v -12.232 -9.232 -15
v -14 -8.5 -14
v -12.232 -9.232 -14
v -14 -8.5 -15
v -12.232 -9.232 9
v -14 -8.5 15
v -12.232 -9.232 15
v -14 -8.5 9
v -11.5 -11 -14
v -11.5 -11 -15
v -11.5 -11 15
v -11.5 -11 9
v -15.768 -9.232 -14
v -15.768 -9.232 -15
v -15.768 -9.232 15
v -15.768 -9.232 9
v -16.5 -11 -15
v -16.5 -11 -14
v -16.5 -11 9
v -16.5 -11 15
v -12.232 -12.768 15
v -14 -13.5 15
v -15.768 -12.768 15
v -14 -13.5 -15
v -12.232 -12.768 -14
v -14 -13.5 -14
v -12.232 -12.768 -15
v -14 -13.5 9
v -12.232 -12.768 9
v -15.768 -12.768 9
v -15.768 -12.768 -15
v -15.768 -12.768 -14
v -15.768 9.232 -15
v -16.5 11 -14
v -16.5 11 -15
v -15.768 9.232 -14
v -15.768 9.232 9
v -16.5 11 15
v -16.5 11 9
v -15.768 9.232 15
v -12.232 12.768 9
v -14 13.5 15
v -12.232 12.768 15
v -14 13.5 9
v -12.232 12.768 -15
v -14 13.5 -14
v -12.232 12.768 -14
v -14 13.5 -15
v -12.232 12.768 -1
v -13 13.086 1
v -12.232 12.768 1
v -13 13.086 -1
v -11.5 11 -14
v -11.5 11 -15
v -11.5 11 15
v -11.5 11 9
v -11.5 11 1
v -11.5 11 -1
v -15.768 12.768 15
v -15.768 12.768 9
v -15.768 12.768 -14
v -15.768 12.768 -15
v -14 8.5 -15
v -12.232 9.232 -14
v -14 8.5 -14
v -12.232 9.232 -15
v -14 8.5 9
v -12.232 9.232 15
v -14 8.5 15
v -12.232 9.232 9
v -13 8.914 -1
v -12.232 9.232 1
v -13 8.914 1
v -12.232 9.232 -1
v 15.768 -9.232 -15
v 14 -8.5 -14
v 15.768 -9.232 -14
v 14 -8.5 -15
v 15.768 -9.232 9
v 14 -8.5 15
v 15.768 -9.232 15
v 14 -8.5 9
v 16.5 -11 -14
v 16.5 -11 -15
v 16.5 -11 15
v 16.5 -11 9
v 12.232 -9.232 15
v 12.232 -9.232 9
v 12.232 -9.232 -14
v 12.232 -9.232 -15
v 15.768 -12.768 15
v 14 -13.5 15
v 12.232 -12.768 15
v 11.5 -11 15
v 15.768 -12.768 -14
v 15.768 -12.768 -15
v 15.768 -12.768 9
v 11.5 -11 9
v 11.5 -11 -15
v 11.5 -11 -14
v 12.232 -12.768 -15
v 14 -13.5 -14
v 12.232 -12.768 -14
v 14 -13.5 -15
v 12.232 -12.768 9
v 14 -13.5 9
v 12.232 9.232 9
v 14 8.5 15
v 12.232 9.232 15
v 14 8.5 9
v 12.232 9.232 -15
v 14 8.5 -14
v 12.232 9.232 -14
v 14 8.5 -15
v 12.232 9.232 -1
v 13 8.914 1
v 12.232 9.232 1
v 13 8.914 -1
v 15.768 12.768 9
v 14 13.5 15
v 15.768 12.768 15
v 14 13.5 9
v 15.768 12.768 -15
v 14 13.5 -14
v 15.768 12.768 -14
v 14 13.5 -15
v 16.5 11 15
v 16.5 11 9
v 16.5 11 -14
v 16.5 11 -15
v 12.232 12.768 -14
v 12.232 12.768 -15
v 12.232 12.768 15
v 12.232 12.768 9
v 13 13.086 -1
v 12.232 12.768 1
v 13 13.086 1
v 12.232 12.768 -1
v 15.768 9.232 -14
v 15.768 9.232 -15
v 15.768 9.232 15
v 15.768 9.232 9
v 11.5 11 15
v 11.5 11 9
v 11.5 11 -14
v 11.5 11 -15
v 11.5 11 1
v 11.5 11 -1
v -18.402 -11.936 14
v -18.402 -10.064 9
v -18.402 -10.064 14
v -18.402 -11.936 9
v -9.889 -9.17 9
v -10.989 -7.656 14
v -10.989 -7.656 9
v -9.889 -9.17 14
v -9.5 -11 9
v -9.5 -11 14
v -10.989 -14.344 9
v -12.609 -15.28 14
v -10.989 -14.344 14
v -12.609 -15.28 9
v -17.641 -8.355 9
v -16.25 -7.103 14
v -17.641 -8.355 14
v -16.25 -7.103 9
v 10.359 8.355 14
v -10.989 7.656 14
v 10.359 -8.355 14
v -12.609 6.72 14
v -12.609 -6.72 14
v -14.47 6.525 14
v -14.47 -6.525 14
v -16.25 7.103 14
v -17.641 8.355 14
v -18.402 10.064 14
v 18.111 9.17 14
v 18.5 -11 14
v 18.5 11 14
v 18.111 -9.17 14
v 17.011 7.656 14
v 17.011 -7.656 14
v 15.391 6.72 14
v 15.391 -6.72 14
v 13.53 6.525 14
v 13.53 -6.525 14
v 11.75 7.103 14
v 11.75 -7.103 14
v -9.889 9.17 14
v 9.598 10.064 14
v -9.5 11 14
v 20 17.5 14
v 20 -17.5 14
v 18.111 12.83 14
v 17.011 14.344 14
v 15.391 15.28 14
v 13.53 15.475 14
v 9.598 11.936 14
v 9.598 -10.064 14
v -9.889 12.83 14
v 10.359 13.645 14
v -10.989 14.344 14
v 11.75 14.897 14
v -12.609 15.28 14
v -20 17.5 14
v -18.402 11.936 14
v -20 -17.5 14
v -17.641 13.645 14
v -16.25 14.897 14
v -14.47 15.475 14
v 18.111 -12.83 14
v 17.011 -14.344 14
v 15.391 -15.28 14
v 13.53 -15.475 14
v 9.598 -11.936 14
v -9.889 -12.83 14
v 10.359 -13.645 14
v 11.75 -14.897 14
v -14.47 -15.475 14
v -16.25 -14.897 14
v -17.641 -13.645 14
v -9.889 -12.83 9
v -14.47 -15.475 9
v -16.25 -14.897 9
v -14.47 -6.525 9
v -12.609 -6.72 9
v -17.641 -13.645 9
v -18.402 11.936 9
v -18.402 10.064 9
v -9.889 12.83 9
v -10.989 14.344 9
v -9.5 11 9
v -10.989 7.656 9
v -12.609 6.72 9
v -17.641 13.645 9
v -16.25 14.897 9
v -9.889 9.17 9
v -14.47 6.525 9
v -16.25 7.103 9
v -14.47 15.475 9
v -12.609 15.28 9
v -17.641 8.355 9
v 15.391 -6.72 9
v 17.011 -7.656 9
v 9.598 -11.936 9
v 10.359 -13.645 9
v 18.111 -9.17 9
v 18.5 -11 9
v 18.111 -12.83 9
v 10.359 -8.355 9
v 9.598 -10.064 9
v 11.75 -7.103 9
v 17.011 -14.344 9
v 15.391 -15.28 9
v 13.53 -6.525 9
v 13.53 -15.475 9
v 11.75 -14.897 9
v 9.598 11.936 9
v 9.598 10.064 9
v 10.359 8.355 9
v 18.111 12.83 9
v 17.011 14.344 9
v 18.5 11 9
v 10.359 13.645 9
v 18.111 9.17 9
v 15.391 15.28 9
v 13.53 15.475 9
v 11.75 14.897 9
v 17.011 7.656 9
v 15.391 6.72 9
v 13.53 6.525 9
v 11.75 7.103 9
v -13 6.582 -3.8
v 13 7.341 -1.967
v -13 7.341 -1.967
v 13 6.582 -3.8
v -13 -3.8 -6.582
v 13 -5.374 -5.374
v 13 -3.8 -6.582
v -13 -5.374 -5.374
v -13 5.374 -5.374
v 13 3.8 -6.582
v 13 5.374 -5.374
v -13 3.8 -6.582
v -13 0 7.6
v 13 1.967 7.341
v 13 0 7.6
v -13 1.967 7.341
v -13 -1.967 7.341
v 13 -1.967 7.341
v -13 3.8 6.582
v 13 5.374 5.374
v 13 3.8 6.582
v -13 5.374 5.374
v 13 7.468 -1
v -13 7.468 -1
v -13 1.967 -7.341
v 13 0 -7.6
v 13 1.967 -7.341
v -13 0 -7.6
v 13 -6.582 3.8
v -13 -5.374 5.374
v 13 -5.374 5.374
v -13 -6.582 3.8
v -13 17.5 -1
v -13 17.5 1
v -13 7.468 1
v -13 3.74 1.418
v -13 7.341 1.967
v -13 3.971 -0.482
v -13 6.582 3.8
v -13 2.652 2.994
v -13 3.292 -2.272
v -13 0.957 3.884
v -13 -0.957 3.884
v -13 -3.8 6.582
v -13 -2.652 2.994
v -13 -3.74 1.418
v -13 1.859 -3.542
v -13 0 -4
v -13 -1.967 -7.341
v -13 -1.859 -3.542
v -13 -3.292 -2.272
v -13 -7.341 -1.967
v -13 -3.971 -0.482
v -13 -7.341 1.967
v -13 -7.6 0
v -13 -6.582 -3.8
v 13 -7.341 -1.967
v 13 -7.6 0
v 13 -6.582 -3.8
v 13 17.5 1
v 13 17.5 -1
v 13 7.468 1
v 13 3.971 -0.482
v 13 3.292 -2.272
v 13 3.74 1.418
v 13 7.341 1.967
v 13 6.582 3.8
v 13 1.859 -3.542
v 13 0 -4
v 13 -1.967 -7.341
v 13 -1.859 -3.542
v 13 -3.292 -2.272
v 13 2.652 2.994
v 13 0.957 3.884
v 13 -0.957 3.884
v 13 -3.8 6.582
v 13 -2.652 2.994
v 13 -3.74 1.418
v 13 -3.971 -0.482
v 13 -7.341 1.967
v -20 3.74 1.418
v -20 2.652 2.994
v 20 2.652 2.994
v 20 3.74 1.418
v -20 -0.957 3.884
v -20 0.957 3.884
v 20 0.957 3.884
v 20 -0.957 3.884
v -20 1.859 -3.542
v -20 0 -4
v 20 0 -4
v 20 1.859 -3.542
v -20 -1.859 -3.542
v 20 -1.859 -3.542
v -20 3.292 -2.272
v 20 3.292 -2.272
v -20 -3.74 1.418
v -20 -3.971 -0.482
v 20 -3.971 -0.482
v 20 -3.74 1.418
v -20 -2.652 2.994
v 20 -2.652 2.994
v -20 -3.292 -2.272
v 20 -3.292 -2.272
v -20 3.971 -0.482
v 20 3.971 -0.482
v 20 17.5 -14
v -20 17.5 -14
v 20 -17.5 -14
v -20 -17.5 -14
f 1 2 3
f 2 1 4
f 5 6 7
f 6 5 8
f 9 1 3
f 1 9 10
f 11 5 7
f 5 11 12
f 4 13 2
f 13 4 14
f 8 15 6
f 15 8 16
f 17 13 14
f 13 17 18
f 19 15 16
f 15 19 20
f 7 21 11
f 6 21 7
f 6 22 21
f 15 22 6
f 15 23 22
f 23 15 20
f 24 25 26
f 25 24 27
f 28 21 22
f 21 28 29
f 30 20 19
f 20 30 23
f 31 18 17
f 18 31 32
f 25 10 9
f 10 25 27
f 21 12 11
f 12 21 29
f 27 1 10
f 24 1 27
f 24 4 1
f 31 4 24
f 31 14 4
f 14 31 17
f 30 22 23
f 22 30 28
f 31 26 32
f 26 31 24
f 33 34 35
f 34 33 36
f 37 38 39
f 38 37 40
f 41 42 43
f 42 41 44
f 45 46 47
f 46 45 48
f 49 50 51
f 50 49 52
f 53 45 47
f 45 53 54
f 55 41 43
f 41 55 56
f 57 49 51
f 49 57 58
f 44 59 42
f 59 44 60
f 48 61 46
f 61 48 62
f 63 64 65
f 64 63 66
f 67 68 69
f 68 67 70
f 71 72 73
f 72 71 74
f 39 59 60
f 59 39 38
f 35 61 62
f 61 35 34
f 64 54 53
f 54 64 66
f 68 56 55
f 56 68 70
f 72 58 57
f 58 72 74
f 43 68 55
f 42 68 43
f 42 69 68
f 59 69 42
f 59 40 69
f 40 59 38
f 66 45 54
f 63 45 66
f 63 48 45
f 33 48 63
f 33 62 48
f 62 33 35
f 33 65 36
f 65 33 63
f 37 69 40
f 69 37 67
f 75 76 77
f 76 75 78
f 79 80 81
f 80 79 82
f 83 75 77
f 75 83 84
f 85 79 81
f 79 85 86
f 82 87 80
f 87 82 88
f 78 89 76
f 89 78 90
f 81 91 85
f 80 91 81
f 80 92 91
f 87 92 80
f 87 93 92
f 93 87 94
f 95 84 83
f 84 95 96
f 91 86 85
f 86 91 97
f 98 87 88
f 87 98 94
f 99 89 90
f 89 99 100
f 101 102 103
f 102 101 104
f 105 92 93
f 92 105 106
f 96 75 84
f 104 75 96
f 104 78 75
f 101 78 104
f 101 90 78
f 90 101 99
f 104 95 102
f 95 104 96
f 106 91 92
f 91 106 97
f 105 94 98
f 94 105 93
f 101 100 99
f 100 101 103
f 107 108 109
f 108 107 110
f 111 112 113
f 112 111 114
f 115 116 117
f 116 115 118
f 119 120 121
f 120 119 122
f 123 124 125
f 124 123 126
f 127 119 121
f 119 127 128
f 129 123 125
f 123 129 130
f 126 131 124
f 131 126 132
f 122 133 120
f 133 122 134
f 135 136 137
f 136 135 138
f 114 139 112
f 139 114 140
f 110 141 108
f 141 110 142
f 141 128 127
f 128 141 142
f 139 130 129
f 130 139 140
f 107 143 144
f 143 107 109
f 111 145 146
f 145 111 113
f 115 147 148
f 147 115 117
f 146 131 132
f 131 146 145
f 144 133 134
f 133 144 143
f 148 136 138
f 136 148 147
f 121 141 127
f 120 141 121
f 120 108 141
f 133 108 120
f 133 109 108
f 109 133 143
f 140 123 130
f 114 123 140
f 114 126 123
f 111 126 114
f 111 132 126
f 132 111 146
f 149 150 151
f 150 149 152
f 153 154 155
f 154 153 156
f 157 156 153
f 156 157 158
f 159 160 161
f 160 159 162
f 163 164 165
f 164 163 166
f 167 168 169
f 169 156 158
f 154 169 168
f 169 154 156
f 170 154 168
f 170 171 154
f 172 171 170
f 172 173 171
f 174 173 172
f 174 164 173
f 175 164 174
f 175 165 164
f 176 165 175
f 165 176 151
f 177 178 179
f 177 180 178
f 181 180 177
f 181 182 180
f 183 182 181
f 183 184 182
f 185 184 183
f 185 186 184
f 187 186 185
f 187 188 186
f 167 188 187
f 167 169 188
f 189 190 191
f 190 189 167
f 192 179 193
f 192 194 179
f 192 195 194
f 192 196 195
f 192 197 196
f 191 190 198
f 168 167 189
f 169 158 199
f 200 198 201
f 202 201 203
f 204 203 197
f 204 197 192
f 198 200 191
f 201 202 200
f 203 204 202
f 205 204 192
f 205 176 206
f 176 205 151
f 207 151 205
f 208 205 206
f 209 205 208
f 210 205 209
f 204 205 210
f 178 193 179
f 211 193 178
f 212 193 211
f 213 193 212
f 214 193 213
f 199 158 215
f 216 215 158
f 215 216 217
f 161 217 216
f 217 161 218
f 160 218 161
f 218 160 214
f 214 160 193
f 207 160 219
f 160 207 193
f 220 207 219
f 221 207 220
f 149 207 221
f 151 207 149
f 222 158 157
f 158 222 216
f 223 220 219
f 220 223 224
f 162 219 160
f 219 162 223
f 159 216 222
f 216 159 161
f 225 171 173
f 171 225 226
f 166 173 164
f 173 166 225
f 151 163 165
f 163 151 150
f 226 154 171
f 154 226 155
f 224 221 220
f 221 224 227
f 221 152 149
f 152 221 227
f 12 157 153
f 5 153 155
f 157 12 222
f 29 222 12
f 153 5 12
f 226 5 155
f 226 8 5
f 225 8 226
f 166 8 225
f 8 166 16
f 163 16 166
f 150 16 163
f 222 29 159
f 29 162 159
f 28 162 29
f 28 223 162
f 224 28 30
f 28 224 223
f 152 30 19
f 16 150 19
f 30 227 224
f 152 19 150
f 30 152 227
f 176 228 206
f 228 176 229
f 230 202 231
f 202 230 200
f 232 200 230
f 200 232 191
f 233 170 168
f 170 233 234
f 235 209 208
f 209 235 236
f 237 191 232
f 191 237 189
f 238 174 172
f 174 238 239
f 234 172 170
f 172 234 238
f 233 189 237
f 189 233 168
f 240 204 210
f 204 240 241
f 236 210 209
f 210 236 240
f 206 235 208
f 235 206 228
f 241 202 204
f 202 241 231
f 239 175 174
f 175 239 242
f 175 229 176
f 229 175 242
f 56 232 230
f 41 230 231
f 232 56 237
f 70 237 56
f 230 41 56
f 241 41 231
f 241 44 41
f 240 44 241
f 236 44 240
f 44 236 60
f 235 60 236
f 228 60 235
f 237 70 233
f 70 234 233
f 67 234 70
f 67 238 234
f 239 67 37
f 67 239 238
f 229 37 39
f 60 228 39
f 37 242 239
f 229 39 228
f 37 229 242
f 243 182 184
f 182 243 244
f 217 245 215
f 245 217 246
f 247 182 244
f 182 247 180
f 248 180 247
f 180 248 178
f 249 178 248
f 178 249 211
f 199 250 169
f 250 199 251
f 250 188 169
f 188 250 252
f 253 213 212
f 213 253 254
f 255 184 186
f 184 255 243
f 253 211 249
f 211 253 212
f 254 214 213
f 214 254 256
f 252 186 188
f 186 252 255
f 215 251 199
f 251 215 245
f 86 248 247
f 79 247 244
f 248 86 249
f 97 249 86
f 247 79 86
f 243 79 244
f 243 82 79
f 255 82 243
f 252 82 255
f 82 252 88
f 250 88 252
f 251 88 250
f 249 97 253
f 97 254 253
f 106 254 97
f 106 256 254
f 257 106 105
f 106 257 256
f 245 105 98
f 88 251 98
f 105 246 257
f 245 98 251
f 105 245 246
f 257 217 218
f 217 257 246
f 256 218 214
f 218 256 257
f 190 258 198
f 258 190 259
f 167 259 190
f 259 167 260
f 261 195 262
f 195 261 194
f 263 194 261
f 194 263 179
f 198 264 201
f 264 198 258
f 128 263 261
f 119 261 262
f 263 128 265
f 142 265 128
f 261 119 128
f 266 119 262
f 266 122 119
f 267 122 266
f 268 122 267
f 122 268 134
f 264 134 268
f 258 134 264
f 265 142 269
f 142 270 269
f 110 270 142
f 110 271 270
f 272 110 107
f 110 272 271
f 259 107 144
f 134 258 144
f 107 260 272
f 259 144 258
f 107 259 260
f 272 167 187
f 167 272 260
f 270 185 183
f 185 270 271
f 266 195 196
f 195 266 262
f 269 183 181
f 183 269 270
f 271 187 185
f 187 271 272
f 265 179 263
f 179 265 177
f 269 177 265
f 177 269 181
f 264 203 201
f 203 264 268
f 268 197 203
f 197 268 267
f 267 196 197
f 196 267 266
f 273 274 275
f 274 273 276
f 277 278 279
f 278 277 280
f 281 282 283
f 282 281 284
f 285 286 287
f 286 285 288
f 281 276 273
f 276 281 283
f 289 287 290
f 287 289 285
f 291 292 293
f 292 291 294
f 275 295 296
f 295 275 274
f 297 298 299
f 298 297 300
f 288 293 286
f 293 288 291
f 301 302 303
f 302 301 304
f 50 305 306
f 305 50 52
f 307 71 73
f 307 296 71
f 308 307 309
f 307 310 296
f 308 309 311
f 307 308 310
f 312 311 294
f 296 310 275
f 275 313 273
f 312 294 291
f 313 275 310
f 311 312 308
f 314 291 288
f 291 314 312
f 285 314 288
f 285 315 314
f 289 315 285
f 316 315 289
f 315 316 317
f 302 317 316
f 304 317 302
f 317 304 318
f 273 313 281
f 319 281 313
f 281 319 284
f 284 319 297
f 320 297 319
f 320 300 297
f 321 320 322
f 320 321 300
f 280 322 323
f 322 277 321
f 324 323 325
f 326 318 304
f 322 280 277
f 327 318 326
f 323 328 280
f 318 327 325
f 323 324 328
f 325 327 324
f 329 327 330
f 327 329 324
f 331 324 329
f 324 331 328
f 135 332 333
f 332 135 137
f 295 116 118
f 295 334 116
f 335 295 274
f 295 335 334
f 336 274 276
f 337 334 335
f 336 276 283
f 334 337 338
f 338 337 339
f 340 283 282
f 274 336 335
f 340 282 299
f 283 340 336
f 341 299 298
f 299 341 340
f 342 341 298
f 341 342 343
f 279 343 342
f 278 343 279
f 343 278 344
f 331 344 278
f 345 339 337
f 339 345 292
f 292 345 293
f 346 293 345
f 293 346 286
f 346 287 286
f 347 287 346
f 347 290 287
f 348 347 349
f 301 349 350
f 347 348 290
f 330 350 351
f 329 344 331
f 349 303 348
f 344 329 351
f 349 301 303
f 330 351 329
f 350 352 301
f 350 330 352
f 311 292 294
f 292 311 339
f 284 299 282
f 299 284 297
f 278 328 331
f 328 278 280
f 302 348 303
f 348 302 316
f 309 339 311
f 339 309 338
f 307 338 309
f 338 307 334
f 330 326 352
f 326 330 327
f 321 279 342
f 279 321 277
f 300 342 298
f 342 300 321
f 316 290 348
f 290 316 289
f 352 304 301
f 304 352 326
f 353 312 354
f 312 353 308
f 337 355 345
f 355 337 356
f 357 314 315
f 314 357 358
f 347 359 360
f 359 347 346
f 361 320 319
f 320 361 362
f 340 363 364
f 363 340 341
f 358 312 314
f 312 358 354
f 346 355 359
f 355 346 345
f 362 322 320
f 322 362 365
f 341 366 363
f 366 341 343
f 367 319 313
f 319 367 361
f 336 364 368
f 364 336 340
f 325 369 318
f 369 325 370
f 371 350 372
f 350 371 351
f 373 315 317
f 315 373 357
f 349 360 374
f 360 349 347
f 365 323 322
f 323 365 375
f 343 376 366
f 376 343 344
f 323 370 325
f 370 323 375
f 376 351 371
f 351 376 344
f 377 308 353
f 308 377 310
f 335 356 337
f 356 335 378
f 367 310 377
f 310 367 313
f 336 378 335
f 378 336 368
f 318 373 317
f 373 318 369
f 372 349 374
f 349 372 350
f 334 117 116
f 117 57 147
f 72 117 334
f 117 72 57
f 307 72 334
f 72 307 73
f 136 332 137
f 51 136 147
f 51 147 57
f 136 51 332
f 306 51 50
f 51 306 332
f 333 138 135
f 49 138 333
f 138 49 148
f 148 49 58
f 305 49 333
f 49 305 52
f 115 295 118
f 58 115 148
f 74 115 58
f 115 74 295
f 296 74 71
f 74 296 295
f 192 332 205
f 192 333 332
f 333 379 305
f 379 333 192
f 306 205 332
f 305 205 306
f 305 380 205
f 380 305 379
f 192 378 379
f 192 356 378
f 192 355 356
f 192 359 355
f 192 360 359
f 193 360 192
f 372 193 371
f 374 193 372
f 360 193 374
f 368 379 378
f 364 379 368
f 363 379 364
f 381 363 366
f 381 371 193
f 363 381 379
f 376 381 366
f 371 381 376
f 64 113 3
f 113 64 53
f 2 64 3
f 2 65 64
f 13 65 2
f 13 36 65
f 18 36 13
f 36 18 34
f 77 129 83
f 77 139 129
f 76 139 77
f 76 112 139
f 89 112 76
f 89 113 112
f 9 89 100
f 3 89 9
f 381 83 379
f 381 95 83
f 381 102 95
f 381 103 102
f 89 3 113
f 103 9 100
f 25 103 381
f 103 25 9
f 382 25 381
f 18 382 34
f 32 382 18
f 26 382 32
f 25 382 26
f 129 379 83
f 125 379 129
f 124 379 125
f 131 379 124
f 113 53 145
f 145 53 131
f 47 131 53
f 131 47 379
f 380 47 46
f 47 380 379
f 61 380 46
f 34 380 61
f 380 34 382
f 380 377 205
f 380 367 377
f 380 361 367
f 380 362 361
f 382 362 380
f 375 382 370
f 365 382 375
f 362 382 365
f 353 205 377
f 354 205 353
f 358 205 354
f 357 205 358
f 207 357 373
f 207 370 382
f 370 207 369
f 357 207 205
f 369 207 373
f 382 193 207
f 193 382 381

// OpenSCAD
// Parameters
block_length = 40.0; //[20.0:80.0:0.5]
block_width = 35.0; //[18.0:70.0:0.5]
block_height = 28.0; //[14.0:56.0:0.5]
shaft_diameter = 8.0; //[4.0:16.0:0.1]
bearing_bore_diameter = 8.0; //[4.0:16.0:0.1]
bearing_outer_diameter = 15.0; //[8.0:30.0:0.1]
bearing_length = 24.0; //[12.0:48.0:0.5]
bearing_seat_tolerance = 0.2; //[0.0:0.6:0.05]
mount_hole_count = 4; //[2:4:1]
mount_hole_diameter = 5.0; //[3.0:8.0:0.1]
mount_hole_spacing_x = 28.0; //[14.0:56.0:0.5]
mount_hole_spacing_y = 22.0; //[11.0:44.0:0.5]
mount_hole_edge_margin = 4.0; //[2.0:10.0:0.5]
counterbore_diameter = 9.0; //[6.0:16.0:0.1]
counterbore_depth = 4.0; //[1.0:10.0:0.5]
clamp_slot_width = 2.0; //[1.0:5.0:0.1]
clamp_slot_depth = 10.0; //[5.0:20.0:0.5]
overlap = 1.0; //[0.5:2.0:0.1]

// SCS Bearing Block
module scs_bearing_block() {
  color("Silver") {
    cube([block_length, block_width, block_height], center=true);
  }
}

// SCS Bearing Block Hole Positions
module scs_bearing_block_hole_positions() {
  color("Black") {
    for (x = [-1, 1])
      for (y = [-1, 1])
        translate([x * mount_hole_spacing_x / 2, y * mount_hole_spacing_y / 2, 0])
          cylinder(r=mount_hole_diameter/2, h=block_height + 2*overlap, center=true);
  }
}

// SBR Bearing Block Hole Positions
module sbr_bearing_block_hole_positions() {
  color("Black") {
    for (x = [-1, 1])
      for (y = [-1, 1])
        translate([x * mount_hole_spacing_x / 2, y * mount_hole_spacing_y / 2, 0])
          cylinder(r=mount_hole_diameter/2, h=block_height + 2*overlap, center=true);
  }
}

// SCS Bearing Block Assembly
module scs_bearing_block_assembly() {
  difference() {
    scs_bearing_block();
    union() {
      // Bearing bore
      rotate([0, 90, 0])
        cylinder(r=(bearing_outer_diameter + bearing_seat_tolerance)/2, h=bearing_length + 2*overlap, center=true);
      // Shaft clearance
      rotate([0, 90, 0])
        cylinder(r=shaft_diameter/2, h=block_length + 2*overlap, center=true);
      // Mounting holes
      scs_bearing_block_hole_positions();
      // Counterbores
      for (x = [-1, 1])
        for (y = [-1, 1])
          translate([x * mount_hole_spacing_x / 2, y * mount_hole_spacing_y / 2, block_height/2 - (counterbore_depth + overlap)/2])
            cylinder(r=counterbore_diameter/2, h=counterbore_depth + overlap, center=true);
      // Clamp slot
      translate([0, block_width/2 - (clamp_slot_depth + overlap)/2, 0])
        cube([bearing_length + 2*overlap, clamp_slot_depth + overlap, clamp_slot_width], center=true);
    }
  }
}

// Assembly
module assembly() {
  scs_bearing_block_assembly();
  sbr_bearing_block_hole_positions();
}

assembly();
